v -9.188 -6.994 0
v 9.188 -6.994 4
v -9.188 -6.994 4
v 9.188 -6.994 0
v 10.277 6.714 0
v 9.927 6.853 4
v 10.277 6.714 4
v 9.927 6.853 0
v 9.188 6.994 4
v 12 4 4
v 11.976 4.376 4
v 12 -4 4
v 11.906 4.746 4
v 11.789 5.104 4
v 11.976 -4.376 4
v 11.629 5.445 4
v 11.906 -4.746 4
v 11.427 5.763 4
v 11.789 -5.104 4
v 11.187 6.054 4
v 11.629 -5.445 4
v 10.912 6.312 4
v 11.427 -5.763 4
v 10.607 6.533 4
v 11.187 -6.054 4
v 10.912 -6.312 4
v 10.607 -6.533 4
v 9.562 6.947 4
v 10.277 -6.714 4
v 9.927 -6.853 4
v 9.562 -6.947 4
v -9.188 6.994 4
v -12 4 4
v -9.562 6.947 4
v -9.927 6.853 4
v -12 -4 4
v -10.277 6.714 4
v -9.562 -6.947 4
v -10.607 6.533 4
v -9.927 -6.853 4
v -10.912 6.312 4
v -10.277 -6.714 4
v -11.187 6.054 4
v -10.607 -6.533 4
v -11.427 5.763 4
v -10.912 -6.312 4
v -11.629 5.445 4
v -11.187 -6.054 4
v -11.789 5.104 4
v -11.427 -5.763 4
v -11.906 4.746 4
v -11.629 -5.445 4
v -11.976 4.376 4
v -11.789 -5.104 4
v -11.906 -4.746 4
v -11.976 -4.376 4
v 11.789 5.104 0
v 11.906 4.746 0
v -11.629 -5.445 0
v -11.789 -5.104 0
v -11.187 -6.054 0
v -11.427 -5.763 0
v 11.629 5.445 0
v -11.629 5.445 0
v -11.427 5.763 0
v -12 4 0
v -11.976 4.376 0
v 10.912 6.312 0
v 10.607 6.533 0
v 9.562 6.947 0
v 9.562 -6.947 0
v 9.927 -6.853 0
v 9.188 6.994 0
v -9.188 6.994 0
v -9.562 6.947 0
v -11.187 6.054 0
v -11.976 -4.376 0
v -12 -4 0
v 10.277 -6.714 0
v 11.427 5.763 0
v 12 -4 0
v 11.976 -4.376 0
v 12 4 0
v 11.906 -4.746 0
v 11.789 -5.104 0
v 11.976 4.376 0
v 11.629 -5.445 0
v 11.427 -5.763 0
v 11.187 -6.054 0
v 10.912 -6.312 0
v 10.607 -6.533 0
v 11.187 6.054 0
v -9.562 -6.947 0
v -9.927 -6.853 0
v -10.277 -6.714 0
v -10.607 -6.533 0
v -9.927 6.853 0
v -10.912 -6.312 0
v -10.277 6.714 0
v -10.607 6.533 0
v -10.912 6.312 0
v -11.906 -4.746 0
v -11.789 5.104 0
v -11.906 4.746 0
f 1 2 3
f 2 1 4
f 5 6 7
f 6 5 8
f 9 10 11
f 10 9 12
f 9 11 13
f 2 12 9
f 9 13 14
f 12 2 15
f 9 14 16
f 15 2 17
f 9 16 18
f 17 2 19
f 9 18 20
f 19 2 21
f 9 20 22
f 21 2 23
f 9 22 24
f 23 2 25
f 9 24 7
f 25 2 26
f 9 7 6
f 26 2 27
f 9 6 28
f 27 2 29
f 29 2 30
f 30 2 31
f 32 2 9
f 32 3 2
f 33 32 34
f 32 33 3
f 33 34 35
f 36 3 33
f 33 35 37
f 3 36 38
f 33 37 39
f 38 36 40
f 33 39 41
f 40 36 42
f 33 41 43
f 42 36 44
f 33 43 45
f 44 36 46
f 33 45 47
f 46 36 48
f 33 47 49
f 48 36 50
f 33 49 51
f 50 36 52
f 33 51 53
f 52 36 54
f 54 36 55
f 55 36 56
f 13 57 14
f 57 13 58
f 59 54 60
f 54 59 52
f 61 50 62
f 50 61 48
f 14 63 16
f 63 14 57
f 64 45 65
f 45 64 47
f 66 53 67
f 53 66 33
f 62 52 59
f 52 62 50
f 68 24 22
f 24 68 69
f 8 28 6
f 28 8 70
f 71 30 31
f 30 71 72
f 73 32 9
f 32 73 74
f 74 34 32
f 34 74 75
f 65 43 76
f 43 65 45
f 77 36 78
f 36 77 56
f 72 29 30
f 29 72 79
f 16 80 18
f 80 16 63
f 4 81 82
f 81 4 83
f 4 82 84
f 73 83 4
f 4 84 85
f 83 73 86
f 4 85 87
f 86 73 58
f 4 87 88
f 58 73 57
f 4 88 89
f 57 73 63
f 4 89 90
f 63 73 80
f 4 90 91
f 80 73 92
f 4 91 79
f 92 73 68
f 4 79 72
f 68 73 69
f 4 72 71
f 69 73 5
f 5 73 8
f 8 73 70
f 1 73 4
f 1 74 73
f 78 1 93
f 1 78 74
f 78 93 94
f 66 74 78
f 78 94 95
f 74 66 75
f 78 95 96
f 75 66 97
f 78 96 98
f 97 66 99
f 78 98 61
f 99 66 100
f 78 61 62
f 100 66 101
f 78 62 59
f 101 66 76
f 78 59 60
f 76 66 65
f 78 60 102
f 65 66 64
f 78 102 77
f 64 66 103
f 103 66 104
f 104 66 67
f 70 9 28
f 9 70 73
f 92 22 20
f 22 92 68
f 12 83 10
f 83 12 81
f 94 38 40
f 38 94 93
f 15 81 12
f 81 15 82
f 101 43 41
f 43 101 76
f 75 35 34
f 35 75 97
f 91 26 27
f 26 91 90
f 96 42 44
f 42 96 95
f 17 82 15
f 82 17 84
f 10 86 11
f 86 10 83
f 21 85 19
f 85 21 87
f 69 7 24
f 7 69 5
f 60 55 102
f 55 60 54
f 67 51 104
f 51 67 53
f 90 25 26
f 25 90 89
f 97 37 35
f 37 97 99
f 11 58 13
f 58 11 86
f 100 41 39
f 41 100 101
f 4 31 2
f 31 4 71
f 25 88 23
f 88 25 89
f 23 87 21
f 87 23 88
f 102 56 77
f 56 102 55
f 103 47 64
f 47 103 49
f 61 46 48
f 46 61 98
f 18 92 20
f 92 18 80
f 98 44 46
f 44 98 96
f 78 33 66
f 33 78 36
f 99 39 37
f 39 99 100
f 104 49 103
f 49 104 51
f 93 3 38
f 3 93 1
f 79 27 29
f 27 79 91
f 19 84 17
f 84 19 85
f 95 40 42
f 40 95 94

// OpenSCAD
$fn = 50;

difference() {
	union() {
		hull() {
			translate(v = [-9.0, 4.0, 0]) {
				cylinder(h = 4, r = 3);
			}
			translate(v = [9.0, 4.0, 0]) {
				cylinder(h = 4, r = 3);
			}
			translate(v = [-9.0, -4.0, 0]) {
				cylinder(h = 4, r = 3);
			}
			translate(v = [9.0, -4.0, 0]) {
				cylinder(h = 4, r = 3);
			}
		}
	}
	union();
}
